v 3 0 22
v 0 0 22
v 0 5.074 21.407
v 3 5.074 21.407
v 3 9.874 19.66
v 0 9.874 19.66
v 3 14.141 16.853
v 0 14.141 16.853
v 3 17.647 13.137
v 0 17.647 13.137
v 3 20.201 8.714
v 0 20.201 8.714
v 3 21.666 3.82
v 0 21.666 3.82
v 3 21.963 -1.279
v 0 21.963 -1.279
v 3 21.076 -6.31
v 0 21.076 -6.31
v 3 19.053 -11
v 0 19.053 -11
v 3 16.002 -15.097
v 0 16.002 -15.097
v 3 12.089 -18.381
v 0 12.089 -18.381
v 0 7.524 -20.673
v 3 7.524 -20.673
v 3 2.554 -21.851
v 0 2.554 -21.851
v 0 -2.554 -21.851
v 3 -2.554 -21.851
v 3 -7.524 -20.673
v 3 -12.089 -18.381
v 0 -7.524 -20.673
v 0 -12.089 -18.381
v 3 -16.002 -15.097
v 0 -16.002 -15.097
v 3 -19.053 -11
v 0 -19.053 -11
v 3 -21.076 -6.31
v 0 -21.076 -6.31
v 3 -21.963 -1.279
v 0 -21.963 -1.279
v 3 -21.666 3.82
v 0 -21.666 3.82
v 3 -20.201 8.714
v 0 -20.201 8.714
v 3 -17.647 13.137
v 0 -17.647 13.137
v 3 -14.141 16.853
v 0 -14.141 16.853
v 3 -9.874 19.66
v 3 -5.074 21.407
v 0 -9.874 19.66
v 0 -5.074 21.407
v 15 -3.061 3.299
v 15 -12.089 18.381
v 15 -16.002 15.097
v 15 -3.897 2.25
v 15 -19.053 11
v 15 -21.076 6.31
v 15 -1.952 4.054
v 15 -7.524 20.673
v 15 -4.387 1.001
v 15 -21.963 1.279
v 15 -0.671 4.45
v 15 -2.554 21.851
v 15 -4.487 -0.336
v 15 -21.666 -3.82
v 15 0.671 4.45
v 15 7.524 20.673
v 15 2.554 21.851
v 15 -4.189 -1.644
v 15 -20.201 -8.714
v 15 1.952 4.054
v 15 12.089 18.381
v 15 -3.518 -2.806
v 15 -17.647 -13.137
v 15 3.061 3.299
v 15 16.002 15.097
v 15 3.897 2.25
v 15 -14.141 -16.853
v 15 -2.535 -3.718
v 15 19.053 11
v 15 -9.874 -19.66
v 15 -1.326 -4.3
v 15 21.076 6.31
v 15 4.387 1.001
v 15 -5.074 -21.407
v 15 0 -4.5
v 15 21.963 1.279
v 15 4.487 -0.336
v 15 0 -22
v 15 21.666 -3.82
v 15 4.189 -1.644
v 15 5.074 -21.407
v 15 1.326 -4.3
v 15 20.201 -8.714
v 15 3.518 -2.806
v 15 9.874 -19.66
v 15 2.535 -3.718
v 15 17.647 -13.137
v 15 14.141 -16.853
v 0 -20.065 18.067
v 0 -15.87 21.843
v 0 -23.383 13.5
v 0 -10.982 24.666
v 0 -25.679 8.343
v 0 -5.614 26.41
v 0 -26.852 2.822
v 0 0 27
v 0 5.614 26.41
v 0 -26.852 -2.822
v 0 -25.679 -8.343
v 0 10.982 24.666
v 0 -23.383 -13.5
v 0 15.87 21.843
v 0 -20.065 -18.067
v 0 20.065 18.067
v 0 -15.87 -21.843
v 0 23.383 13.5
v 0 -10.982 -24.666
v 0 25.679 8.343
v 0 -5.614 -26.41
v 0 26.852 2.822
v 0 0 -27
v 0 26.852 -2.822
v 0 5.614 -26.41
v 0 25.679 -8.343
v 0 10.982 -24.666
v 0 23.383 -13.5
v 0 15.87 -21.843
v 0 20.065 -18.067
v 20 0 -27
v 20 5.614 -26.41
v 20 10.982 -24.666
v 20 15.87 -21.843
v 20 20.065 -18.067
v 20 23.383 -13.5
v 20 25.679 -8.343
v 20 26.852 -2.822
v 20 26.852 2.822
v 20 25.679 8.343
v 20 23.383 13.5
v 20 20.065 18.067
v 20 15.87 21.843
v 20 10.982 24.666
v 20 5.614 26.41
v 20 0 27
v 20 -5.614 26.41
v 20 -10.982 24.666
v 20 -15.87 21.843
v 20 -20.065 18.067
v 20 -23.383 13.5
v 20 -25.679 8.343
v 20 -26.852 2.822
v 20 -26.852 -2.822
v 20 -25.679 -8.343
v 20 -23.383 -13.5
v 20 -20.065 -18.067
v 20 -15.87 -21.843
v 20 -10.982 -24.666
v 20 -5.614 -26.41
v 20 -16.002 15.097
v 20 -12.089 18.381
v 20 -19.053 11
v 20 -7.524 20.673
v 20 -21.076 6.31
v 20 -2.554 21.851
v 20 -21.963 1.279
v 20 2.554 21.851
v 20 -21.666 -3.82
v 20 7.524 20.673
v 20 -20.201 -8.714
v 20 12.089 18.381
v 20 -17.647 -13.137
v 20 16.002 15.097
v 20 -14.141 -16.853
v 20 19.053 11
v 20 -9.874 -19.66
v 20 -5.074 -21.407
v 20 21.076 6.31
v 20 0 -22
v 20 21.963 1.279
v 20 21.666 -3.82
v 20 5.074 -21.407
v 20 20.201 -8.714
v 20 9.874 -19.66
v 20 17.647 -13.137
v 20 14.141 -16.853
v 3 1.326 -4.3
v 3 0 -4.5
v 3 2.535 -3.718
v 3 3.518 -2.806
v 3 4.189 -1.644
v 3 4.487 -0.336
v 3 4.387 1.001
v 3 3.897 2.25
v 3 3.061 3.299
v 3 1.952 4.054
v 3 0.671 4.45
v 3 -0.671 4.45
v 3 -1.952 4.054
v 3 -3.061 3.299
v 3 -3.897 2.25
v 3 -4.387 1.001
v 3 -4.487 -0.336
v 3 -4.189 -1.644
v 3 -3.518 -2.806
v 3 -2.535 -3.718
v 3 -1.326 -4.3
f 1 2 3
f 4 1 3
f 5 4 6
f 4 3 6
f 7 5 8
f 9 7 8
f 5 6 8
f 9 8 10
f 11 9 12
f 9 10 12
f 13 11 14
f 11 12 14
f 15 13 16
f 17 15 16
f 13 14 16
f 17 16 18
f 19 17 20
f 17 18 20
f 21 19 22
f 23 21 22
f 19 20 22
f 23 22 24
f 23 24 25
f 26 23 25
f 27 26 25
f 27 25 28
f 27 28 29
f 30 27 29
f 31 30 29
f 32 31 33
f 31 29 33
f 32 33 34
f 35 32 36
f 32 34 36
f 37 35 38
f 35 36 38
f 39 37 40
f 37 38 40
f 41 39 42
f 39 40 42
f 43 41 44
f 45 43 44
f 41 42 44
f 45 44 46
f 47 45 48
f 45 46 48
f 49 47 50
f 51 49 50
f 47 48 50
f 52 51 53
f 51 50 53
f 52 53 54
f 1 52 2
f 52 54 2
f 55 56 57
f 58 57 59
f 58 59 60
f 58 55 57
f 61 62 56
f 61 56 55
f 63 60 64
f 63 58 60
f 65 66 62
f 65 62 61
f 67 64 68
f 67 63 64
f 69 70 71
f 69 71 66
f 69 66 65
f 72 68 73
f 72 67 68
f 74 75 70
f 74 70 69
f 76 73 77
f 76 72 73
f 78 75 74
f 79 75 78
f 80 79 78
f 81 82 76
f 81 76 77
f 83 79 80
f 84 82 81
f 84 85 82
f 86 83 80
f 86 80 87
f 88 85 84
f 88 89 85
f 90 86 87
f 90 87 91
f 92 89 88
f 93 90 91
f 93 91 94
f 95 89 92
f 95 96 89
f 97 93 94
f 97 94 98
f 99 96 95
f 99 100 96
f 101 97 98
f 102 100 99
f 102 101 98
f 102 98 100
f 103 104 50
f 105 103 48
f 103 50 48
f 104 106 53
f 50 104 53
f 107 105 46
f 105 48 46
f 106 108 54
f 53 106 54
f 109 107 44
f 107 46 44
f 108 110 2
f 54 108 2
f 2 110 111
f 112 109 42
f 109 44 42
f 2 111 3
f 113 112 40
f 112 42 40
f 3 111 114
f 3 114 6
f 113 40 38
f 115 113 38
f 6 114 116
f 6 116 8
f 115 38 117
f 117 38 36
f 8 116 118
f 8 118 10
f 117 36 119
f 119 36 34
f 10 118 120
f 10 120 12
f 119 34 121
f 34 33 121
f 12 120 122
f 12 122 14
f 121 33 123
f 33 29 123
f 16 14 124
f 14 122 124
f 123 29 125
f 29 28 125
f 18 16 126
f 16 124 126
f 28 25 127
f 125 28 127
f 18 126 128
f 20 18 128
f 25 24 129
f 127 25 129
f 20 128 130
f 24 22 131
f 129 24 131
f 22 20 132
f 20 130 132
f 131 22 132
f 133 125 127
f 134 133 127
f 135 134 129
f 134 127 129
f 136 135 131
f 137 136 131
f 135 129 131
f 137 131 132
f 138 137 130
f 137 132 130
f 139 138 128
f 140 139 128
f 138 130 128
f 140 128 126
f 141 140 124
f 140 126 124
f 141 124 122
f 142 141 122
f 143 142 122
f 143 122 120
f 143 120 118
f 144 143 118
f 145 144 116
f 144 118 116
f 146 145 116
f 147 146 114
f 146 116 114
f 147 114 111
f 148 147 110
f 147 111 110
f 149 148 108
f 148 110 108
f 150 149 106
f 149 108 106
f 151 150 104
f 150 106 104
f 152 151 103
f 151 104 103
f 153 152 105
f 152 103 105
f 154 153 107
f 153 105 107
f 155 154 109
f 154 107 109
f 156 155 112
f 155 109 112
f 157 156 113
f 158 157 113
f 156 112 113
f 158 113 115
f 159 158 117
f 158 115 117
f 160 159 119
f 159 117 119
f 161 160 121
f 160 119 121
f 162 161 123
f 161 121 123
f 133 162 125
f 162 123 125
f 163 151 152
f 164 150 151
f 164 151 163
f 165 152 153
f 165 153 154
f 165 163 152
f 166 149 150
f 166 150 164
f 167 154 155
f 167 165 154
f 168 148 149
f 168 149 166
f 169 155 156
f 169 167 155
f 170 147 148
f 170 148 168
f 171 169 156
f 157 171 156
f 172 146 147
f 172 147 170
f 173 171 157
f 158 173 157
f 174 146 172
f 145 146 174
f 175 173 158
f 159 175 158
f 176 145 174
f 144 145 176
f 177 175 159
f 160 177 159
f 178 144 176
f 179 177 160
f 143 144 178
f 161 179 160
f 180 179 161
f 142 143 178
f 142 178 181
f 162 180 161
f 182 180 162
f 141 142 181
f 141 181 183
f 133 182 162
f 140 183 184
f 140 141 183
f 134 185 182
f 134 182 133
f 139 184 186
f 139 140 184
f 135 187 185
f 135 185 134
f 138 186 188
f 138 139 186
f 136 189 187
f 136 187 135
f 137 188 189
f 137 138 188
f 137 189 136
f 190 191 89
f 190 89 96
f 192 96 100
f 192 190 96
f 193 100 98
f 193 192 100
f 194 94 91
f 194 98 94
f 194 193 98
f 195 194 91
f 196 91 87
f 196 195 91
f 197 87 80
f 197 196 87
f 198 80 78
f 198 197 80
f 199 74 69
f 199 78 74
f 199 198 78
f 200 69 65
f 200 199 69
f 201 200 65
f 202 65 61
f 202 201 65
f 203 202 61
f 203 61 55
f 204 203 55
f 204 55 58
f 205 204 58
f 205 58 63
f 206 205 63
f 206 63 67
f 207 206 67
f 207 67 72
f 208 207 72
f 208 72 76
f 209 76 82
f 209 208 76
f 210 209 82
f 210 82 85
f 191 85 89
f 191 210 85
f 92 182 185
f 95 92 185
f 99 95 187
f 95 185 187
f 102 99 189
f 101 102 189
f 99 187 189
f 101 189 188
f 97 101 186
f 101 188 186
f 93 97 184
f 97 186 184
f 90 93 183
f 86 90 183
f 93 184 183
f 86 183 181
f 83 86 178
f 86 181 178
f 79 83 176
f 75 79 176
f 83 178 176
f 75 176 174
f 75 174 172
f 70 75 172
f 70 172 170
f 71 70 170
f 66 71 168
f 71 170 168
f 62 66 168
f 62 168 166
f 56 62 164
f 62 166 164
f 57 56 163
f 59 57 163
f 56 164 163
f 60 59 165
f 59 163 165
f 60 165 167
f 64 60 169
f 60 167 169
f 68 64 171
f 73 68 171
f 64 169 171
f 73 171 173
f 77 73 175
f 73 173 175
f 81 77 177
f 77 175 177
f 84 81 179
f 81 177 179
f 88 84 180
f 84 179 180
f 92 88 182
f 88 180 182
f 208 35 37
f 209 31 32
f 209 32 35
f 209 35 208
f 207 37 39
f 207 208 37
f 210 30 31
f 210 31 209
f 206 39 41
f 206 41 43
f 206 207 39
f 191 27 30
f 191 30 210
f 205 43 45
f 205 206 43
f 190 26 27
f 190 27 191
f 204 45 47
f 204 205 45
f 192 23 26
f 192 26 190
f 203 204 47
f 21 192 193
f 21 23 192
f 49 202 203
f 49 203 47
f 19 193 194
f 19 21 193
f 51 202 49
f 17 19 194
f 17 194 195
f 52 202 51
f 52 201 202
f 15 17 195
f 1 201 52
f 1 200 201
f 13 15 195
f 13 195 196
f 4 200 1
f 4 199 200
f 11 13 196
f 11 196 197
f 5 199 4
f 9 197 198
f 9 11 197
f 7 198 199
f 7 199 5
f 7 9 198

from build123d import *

# Parameters (mm, degrees)
ESQUISSE1_R             = 27
ESQUISSE1_R_2           = 4.5
EXTRUSION1_DEPTH        = 20
ESQUISSE2_R             = 22
ENL_V_MAT_EXTRU_1_DEPTH = 3
ESQUISSE3_R             = 22
ENL_V_MAT_EXTRU_2_DEPTH = 5


with BuildPart() as part:
    # Esquisse1 → Extrusion1 (new body)
    with BuildSketch(Plane(origin=(0, 0, 0), x_dir=(0, 0, -1), z_dir=(1, 0, 0))):
        Circle(ESQUISSE1_R)
        Circle(ESQUISSE1_R_2, mode=Mode.SUBTRACT)
    extrude(amount=EXTRUSION1_DEPTH)

    # Esquisse2 → Enlèv. mat.-Extru.1 (cut)
    with BuildSketch(Plane.ZY):
        Circle(ESQUISSE2_R)
    extrude(amount=-ENL_V_MAT_EXTRU_1_DEPTH, mode=Mode.SUBTRACT)

    # Esquisse3 → Enlèv. mat.-Extru.2 (cut)
    with BuildSketch(Plane(origin=(20, 0, 0), x_dir=(0, 0, -1), z_dir=(1, 0, 0))):
        Circle(ESQUISSE3_R)
    extrude(amount=-ENL_V_MAT_EXTRU_2_DEPTH, mode=Mode.SUBTRACT)


solid = part.part
